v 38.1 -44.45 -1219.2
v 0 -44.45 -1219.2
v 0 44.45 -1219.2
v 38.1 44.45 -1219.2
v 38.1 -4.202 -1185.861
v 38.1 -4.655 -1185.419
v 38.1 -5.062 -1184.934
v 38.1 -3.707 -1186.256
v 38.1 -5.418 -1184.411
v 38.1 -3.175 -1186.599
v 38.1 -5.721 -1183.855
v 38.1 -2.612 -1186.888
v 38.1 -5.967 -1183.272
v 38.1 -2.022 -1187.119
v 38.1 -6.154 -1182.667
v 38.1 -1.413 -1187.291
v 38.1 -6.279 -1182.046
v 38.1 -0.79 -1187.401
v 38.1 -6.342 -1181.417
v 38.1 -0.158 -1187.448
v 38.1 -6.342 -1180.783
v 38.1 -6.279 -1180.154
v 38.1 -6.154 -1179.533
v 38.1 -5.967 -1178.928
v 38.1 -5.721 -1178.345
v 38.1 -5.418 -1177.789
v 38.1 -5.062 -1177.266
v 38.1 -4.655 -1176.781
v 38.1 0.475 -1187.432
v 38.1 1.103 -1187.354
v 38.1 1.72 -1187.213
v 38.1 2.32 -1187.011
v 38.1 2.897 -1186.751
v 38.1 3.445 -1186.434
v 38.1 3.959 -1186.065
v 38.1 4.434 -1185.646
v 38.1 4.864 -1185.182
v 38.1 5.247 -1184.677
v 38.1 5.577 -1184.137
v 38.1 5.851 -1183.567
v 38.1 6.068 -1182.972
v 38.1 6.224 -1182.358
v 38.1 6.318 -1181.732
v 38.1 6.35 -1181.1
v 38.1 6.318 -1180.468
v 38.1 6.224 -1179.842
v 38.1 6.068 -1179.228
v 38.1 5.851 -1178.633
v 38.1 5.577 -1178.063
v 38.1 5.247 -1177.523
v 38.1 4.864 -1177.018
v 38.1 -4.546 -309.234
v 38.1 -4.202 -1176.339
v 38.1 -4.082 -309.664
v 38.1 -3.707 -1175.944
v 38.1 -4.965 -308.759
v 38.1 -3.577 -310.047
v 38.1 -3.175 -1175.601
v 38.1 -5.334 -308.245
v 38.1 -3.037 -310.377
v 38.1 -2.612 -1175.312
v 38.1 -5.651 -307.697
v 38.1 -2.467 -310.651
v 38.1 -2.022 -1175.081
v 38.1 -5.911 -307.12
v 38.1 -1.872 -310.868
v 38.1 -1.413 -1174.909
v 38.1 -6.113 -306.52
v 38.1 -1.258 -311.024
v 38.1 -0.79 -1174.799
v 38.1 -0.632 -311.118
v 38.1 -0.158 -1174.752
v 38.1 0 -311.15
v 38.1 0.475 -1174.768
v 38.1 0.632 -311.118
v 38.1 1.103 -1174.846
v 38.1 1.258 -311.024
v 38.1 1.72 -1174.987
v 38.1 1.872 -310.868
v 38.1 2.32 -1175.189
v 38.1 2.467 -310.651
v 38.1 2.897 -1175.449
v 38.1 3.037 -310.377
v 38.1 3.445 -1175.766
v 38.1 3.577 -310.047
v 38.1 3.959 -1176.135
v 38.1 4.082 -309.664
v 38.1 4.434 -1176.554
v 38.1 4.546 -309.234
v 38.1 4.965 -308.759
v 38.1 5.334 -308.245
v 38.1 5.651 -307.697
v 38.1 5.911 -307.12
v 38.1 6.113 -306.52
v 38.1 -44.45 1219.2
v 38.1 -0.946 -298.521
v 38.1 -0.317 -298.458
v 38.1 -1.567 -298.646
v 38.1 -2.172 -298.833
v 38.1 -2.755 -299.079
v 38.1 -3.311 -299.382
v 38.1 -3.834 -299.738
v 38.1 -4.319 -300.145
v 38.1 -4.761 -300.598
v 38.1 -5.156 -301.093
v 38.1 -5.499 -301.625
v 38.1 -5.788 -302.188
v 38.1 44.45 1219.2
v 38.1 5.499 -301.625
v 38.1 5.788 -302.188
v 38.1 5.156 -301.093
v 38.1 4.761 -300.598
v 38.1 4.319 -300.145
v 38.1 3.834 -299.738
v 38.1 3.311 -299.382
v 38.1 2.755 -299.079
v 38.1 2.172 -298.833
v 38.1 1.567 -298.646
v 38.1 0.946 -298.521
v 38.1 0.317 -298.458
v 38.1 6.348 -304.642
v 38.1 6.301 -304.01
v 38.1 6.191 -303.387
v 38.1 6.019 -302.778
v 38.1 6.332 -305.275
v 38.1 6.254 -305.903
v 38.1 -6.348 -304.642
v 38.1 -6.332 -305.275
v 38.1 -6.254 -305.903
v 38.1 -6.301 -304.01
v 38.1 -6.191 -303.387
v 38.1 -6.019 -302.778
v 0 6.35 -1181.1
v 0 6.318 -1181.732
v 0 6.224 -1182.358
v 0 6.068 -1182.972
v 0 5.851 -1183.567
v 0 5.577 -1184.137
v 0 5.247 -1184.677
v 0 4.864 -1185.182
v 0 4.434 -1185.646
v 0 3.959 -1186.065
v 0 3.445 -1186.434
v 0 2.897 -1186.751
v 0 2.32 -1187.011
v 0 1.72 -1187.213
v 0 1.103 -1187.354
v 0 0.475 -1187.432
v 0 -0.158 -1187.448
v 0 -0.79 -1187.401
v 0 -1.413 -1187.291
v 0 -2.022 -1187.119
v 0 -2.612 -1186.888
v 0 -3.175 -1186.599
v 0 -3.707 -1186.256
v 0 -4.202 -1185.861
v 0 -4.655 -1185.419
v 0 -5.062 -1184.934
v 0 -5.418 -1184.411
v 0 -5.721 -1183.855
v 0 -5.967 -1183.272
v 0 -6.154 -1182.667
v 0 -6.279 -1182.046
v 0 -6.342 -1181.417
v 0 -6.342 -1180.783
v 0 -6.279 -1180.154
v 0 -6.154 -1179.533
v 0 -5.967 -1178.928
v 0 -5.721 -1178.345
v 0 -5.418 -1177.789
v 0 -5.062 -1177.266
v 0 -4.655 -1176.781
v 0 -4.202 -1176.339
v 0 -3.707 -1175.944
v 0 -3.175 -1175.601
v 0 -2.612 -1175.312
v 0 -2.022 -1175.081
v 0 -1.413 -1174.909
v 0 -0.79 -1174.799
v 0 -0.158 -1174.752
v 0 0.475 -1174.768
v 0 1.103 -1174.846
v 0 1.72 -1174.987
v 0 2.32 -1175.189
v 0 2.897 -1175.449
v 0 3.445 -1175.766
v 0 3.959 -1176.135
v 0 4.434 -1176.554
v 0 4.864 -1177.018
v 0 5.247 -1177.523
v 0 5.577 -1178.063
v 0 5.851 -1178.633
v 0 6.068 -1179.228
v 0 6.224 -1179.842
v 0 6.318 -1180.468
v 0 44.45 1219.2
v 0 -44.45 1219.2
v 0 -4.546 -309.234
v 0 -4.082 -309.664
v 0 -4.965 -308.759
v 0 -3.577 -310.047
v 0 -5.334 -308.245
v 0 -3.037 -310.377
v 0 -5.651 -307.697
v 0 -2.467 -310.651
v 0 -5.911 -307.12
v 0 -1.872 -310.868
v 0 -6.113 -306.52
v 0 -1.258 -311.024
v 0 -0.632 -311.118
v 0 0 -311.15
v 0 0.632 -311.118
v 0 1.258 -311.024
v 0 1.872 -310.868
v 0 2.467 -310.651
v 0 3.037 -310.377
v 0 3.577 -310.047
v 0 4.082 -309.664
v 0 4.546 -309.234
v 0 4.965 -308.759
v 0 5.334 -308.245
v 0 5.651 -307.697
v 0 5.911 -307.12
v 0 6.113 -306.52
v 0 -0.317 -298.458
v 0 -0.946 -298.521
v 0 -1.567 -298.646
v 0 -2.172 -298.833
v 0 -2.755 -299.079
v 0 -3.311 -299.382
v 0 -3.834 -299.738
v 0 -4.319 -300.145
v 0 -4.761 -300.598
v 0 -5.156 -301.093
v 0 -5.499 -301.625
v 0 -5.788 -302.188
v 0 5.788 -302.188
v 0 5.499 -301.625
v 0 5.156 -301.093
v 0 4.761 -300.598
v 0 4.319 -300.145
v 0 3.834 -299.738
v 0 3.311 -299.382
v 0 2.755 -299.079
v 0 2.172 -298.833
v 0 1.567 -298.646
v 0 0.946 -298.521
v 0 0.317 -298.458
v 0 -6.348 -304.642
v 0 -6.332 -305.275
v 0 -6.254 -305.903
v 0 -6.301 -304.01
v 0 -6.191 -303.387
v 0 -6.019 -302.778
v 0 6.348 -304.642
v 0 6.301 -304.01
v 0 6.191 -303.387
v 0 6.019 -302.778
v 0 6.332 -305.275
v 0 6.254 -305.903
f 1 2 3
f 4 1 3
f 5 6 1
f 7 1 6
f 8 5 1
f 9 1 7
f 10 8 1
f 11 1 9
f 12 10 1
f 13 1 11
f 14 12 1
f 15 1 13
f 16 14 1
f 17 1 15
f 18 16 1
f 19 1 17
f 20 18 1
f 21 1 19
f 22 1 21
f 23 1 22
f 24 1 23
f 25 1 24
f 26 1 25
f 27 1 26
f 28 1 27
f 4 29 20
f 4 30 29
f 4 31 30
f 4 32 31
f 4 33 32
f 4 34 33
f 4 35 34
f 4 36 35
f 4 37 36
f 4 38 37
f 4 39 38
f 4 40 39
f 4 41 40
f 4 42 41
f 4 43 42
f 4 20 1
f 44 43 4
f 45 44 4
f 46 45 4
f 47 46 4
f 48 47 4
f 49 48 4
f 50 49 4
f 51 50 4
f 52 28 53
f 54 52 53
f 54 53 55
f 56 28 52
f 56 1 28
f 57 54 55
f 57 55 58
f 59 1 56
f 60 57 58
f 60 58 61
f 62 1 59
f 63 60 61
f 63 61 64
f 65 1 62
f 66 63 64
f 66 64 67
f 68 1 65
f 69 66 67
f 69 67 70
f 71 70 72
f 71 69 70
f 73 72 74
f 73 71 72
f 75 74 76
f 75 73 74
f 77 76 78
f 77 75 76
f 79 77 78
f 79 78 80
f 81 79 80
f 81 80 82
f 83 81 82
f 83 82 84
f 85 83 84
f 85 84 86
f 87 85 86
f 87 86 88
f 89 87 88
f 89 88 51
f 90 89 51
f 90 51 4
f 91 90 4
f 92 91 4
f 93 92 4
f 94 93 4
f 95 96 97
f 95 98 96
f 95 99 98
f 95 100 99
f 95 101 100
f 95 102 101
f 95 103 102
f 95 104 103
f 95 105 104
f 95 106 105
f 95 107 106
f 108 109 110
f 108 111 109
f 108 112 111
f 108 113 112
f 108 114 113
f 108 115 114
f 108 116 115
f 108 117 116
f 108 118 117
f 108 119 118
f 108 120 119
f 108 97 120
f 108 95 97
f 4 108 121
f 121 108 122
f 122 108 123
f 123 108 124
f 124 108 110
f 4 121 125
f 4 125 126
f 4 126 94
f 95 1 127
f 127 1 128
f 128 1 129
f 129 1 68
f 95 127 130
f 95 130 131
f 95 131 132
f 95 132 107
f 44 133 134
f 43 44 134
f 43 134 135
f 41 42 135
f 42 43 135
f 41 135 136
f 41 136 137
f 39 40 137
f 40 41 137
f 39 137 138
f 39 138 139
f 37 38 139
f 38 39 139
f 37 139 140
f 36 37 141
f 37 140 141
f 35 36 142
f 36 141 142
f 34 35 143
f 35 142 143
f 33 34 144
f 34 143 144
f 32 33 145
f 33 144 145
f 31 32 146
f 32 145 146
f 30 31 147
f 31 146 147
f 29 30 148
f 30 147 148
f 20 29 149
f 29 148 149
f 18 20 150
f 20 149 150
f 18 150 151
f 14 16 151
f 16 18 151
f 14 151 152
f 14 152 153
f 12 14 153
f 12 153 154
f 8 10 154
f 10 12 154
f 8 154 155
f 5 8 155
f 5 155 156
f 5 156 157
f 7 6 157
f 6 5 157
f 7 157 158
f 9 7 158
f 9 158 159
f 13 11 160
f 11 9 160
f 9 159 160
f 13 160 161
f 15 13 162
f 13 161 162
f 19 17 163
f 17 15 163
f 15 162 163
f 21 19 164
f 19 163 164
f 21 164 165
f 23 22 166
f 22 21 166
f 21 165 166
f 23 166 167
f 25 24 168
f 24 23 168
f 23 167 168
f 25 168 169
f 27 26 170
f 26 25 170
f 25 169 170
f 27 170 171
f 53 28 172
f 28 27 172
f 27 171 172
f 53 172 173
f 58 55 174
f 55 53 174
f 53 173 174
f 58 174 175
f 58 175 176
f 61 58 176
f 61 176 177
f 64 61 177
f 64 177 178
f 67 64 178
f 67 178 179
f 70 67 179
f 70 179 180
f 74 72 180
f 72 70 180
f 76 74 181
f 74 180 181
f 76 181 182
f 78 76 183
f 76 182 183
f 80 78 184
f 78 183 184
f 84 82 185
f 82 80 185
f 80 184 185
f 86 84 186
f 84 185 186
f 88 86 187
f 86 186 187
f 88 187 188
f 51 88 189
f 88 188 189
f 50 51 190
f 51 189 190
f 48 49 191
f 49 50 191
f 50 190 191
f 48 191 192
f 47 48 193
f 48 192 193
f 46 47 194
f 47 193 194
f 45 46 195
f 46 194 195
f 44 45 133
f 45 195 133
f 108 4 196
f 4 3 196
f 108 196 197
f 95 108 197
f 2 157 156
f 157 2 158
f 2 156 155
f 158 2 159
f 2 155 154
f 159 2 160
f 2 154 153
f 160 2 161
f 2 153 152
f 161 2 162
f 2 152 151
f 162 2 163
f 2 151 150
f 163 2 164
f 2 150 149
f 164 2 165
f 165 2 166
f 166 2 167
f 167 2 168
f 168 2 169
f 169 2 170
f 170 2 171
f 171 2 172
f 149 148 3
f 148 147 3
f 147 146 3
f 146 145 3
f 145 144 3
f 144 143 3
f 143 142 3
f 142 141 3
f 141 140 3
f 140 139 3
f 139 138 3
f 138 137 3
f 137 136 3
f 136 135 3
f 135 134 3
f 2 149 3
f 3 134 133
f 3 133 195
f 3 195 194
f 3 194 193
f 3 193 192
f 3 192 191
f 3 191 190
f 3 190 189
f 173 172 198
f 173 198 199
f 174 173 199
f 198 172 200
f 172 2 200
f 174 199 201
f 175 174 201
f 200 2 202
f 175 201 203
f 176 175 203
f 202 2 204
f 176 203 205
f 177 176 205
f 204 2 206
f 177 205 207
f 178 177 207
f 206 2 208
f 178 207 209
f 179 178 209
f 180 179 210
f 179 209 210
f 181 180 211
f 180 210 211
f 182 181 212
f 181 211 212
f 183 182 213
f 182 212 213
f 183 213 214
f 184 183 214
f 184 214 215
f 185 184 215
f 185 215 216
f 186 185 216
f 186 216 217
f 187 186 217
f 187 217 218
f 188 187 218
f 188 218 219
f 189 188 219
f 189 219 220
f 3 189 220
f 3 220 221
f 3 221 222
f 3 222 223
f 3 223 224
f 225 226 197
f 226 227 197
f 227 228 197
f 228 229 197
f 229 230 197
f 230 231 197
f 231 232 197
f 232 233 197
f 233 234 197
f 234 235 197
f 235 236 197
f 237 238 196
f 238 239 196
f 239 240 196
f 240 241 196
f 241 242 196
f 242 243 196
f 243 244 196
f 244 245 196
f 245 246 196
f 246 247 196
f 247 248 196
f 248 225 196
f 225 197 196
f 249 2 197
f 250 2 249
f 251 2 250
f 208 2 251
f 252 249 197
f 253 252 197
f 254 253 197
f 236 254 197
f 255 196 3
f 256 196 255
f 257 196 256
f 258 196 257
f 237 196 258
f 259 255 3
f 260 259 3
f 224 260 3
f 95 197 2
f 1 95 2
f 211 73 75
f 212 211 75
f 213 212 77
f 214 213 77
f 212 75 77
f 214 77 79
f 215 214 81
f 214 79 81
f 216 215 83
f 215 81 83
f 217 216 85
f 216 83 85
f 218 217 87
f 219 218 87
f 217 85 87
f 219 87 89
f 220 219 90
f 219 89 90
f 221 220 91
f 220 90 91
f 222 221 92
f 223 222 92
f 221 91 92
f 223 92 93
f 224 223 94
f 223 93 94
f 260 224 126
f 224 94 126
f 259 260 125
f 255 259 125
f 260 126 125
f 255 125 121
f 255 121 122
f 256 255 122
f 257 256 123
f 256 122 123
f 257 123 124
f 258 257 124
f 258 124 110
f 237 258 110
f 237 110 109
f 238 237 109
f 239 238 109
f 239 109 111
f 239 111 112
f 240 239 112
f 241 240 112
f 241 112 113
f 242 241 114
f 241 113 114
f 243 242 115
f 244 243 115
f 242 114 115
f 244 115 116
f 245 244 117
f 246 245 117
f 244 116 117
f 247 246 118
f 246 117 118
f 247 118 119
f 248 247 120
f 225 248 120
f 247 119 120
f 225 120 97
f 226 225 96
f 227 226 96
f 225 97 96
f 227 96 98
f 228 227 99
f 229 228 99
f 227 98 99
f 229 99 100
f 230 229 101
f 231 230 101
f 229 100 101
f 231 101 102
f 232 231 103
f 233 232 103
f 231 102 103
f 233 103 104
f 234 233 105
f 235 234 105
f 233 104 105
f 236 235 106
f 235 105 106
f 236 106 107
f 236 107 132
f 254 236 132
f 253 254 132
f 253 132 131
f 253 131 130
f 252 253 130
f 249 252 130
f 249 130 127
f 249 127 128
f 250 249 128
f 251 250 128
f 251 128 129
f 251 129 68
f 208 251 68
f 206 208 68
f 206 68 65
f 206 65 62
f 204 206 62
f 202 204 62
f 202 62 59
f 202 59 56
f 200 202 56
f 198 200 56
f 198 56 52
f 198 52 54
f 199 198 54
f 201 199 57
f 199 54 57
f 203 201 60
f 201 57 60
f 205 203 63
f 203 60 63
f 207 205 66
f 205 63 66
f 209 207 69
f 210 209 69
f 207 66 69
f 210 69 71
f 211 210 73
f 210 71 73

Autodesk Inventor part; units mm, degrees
ref_plane "YZ Plane" through (0, 0, 0) normal (1, 0, 0) x (0, 1, 0)
ref_plane "XZ Plane" through (0, 0, 0) normal (0, 1, 0) x (-1, 0, 0)
ref_plane "XY Plane" through (0, 0, 0) normal (0, 0, 1) x (1, 0, 0)
sketch "Sketch1" plane through (0, 0, 0) normal (1, 0, 0) x (0, 1, 0)
  line L0 (44.45, 1219.2) -> (-44.45, 1219.2)
  line L1 (-44.45, 1219.2) -> (-44.45, -1219.2)
  line L2 (-44.45, -1219.2) -> (44.45, -1219.2)
  line L3 (44.45, -1219.2) -> (44.45, 1219.2)
  line L4 (44.45, 1219.2) -> (-44.45, -1219.2) construction
  line L5 (-44.45, 1219.2) -> (44.45, -1219.2) construction
  line L6 (44.45, -1219.2) -> (-44.45, -1219.2) construction
  line L7 (-44.45, -1219.2) -> (-44.45, -1181.1) construction
  line L8 (-44.45, -1181.1) -> (44.45, -1181.1) construction
  line L9 (44.45, -1181.1) -> (44.45, -1219.2) construction
  circle A0 centre (0, -1181.1) radius 6.35
  point P0 (0, 0)
  dimension "d0" = 88.9
  dimension "d1" = 2438.4
  dimension "d2" = 88.9
  dimension "d3" = 38.1
  dimension "d4" = 12.7
extrude "Extrusion1" add sketch "Sketch1" along normal blind 38.1
sketch "Sketch2" plane through (38.1, 0, 0) normal (1, 0, 0) x (0, 0, -1)
  circle A0 centre (1181.1, 0) radius 6.35 projected
  line L0 (1181.1, 0) -> (304.8, 0) construction
  circle A1 centre (304.8, 0) radius 6.35
  point P0 (0, 0)
  dimension "d7" = 876.3
  dimension "d8" = 12.7
extrude "Extrusion2" cut sketch "Sketch2" against normal blind 38.1 contours A1
properties part number "Trebuchet Arm"
